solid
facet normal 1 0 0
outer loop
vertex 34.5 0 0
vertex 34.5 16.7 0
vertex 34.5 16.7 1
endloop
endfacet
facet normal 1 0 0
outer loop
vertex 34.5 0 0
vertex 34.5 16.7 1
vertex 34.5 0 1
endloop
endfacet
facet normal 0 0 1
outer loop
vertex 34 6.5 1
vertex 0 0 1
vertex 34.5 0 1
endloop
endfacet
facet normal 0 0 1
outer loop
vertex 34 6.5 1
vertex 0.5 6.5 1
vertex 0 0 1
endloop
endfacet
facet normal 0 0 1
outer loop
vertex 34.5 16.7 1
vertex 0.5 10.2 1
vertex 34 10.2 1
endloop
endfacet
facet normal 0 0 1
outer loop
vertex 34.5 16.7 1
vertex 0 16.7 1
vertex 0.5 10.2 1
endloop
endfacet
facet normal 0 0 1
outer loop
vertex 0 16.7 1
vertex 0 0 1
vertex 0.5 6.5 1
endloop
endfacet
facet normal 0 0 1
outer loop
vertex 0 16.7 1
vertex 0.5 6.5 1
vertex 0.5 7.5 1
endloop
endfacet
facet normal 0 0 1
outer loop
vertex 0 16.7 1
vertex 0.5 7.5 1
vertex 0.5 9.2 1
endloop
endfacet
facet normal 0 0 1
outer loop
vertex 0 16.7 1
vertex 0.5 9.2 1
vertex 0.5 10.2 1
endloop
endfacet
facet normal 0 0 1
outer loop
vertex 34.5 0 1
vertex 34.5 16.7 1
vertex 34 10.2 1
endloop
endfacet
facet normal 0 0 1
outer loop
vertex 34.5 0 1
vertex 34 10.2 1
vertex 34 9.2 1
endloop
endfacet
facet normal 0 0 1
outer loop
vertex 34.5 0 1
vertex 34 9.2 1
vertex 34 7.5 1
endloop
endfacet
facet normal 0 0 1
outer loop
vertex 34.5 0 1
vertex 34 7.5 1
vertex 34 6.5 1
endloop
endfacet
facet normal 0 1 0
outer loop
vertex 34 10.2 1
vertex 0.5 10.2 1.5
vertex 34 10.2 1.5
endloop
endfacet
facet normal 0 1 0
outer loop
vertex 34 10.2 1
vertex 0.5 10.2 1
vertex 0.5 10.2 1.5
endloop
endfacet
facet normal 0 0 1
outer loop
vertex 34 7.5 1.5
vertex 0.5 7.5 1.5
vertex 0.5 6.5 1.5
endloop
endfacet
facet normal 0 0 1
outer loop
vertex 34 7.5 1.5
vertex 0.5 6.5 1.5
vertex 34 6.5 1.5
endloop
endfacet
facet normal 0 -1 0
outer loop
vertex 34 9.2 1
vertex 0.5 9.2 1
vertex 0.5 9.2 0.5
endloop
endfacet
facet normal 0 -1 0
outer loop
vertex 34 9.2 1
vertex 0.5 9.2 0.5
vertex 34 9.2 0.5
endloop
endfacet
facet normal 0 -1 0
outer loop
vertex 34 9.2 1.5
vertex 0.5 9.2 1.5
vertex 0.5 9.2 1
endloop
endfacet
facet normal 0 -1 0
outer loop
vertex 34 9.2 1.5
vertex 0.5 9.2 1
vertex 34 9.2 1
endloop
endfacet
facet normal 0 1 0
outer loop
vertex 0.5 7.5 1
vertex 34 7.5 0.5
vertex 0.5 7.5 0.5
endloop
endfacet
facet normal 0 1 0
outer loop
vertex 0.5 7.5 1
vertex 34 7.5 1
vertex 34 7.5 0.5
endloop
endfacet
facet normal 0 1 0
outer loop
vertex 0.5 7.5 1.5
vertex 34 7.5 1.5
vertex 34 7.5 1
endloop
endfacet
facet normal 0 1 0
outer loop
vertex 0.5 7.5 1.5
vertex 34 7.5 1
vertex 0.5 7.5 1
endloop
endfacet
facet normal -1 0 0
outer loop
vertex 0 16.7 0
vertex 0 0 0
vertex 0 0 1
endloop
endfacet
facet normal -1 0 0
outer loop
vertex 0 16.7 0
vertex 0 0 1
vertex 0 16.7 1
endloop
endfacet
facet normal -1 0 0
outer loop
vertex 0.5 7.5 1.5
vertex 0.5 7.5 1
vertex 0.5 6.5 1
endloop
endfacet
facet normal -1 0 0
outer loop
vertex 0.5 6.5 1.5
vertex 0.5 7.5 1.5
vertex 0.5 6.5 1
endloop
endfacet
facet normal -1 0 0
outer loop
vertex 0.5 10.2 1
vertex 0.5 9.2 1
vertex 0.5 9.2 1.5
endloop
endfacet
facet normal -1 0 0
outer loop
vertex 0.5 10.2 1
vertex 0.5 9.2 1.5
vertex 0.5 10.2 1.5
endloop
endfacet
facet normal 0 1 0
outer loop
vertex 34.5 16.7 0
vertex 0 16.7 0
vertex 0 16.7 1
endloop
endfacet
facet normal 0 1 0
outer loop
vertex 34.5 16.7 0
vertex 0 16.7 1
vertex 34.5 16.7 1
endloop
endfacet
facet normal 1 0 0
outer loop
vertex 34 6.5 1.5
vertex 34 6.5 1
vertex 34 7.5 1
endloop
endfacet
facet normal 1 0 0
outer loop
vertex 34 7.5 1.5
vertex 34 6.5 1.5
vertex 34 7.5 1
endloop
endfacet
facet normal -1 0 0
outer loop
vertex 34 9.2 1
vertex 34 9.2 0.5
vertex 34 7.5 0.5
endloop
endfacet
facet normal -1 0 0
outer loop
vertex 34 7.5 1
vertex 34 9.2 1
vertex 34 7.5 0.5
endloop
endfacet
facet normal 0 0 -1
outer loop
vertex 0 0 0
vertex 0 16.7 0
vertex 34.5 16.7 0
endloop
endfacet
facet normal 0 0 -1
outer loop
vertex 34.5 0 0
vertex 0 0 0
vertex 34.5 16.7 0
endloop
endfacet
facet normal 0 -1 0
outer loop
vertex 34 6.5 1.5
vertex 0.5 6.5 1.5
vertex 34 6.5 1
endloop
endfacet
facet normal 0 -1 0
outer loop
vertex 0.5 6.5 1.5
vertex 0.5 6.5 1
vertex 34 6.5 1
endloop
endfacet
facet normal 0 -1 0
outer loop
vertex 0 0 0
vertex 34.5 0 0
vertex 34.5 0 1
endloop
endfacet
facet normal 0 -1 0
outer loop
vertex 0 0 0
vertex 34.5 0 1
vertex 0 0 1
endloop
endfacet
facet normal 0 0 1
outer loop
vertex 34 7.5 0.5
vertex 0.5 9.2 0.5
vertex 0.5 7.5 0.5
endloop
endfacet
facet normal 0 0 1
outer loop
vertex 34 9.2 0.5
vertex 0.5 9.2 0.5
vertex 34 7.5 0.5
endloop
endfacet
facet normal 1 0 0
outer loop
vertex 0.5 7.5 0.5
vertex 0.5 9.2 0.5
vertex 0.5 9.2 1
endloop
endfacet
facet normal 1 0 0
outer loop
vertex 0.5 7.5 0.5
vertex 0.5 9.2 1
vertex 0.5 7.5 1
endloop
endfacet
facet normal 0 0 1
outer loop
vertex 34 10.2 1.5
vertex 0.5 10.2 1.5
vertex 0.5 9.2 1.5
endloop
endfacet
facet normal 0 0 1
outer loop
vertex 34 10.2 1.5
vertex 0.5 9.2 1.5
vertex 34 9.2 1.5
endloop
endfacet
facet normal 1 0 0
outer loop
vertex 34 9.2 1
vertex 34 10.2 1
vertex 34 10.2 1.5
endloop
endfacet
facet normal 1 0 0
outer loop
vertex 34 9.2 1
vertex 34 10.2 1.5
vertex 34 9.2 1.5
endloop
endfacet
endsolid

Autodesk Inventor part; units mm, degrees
ref_plane "YZ Plane" through (0, 0, 0) normal (1, 0, 0) x (0, 1, 0)
ref_plane "XZ Plane" through (0, 0, 0) normal (0, 1, 0) x (-1, 0, 0)
ref_plane "XY Plane" through (0, 0, 0) normal (0, 0, 1) x (1, 0, 0)
sketch "Sketch1" plane through (0, 0, 0) normal (0, 0, 1) x (1, 0, 0)
  line L0 (0, 0) -> (0, 16.7)
  line L1 (0, 16.7) -> (34.5, 16.7)
  line L2 (34.5, 16.7) -> (34.5, 0)
  line L3 (34.5, 0) -> (0, 0)
  dimension "d0" = 16.7
  dimension "d1" = 34.5
extrude "Extrusion1" add sketch "Sketch1" along normal blind 1
sketch "Sketch2" plane through (0, 0, 1) normal (0, 0, 1) x (1, 0, 0)
  line L0 (0, 16.7) -> (0, 0) projected
  line L1 (0, 0) -> (34.5, 0) projected
  line L2 (0, 9.2) -> (34.5, 9.2)
  line L3 (34.5, 9.2) -> (34.5, 7.5)
  line L4 (34.5, 7.5) -> (0, 7.5)
  line L5 (0, 7.5) -> (0, 9.2)
  dimension "d4" = 34.5
  dimension "d5" = 1.7
  dimension "d6" = 7.5
extrude "Extrusion2" cut sketch "Sketch2" against normal blind 0.5
sketch "Sketch3" plane through (0, 0, 0.5) normal (0, 0, 1) x (1, 0, 0)
  line L0 (34.5, 7.5) -> (0, 7.5) projected
  line L1 (34.5, 7.5) -> (0, 7.5) projected
  line L2 (0, 9.2) -> (0.5, 9.2)
  line L3 (0.5, 9.2) -> (0.5, 7.5)
  line L4 (0.5, 7.5) -> (0, 7.5)
  line L5 (0, 7.5) -> (0, 9.2)
  line L6 (34.5, 9.2) -> (34, 9.2)
  line L7 (34, 9.2) -> (34, 7.5)
  line L8 (34, 7.5) -> (34.5, 7.5)
  line L9 (34.5, 7.5) -> (34.5, 9.2)
  point P0 (0, 0)
  dimension "d9" = 0.5
  dimension "d10" = 0.5
extrude "Extrusion3" add sketch "Sketch3" along normal blind 0.5
sketch "Sketch4" plane through (0, 0, 1) normal (0, 0, 1) x (1, 0, 0)
  line L0 (0.5, 10.2) -> (34, 10.2)
  line L1 (34, 10.2) -> (34, 9.2)
  line L2 (34, 9.2) -> (0.5, 9.2)
  line L3 (0.5, 9.2) -> (0.5, 10.2)
  line L4 (34, 7.5) -> (0.5, 7.5)
  line L5 (0.5, 7.5) -> (0.5, 6.5)
  line L6 (0.5, 6.5) -> (34, 6.5)
  line L7 (34, 6.5) -> (34, 7.5)
  dimension "d13" = 1
  dimension "d14" = 1
extrude "Extrusion4" add sketch "Sketch4" along normal blind 0.5
properties part number "Zijplaat 2"
